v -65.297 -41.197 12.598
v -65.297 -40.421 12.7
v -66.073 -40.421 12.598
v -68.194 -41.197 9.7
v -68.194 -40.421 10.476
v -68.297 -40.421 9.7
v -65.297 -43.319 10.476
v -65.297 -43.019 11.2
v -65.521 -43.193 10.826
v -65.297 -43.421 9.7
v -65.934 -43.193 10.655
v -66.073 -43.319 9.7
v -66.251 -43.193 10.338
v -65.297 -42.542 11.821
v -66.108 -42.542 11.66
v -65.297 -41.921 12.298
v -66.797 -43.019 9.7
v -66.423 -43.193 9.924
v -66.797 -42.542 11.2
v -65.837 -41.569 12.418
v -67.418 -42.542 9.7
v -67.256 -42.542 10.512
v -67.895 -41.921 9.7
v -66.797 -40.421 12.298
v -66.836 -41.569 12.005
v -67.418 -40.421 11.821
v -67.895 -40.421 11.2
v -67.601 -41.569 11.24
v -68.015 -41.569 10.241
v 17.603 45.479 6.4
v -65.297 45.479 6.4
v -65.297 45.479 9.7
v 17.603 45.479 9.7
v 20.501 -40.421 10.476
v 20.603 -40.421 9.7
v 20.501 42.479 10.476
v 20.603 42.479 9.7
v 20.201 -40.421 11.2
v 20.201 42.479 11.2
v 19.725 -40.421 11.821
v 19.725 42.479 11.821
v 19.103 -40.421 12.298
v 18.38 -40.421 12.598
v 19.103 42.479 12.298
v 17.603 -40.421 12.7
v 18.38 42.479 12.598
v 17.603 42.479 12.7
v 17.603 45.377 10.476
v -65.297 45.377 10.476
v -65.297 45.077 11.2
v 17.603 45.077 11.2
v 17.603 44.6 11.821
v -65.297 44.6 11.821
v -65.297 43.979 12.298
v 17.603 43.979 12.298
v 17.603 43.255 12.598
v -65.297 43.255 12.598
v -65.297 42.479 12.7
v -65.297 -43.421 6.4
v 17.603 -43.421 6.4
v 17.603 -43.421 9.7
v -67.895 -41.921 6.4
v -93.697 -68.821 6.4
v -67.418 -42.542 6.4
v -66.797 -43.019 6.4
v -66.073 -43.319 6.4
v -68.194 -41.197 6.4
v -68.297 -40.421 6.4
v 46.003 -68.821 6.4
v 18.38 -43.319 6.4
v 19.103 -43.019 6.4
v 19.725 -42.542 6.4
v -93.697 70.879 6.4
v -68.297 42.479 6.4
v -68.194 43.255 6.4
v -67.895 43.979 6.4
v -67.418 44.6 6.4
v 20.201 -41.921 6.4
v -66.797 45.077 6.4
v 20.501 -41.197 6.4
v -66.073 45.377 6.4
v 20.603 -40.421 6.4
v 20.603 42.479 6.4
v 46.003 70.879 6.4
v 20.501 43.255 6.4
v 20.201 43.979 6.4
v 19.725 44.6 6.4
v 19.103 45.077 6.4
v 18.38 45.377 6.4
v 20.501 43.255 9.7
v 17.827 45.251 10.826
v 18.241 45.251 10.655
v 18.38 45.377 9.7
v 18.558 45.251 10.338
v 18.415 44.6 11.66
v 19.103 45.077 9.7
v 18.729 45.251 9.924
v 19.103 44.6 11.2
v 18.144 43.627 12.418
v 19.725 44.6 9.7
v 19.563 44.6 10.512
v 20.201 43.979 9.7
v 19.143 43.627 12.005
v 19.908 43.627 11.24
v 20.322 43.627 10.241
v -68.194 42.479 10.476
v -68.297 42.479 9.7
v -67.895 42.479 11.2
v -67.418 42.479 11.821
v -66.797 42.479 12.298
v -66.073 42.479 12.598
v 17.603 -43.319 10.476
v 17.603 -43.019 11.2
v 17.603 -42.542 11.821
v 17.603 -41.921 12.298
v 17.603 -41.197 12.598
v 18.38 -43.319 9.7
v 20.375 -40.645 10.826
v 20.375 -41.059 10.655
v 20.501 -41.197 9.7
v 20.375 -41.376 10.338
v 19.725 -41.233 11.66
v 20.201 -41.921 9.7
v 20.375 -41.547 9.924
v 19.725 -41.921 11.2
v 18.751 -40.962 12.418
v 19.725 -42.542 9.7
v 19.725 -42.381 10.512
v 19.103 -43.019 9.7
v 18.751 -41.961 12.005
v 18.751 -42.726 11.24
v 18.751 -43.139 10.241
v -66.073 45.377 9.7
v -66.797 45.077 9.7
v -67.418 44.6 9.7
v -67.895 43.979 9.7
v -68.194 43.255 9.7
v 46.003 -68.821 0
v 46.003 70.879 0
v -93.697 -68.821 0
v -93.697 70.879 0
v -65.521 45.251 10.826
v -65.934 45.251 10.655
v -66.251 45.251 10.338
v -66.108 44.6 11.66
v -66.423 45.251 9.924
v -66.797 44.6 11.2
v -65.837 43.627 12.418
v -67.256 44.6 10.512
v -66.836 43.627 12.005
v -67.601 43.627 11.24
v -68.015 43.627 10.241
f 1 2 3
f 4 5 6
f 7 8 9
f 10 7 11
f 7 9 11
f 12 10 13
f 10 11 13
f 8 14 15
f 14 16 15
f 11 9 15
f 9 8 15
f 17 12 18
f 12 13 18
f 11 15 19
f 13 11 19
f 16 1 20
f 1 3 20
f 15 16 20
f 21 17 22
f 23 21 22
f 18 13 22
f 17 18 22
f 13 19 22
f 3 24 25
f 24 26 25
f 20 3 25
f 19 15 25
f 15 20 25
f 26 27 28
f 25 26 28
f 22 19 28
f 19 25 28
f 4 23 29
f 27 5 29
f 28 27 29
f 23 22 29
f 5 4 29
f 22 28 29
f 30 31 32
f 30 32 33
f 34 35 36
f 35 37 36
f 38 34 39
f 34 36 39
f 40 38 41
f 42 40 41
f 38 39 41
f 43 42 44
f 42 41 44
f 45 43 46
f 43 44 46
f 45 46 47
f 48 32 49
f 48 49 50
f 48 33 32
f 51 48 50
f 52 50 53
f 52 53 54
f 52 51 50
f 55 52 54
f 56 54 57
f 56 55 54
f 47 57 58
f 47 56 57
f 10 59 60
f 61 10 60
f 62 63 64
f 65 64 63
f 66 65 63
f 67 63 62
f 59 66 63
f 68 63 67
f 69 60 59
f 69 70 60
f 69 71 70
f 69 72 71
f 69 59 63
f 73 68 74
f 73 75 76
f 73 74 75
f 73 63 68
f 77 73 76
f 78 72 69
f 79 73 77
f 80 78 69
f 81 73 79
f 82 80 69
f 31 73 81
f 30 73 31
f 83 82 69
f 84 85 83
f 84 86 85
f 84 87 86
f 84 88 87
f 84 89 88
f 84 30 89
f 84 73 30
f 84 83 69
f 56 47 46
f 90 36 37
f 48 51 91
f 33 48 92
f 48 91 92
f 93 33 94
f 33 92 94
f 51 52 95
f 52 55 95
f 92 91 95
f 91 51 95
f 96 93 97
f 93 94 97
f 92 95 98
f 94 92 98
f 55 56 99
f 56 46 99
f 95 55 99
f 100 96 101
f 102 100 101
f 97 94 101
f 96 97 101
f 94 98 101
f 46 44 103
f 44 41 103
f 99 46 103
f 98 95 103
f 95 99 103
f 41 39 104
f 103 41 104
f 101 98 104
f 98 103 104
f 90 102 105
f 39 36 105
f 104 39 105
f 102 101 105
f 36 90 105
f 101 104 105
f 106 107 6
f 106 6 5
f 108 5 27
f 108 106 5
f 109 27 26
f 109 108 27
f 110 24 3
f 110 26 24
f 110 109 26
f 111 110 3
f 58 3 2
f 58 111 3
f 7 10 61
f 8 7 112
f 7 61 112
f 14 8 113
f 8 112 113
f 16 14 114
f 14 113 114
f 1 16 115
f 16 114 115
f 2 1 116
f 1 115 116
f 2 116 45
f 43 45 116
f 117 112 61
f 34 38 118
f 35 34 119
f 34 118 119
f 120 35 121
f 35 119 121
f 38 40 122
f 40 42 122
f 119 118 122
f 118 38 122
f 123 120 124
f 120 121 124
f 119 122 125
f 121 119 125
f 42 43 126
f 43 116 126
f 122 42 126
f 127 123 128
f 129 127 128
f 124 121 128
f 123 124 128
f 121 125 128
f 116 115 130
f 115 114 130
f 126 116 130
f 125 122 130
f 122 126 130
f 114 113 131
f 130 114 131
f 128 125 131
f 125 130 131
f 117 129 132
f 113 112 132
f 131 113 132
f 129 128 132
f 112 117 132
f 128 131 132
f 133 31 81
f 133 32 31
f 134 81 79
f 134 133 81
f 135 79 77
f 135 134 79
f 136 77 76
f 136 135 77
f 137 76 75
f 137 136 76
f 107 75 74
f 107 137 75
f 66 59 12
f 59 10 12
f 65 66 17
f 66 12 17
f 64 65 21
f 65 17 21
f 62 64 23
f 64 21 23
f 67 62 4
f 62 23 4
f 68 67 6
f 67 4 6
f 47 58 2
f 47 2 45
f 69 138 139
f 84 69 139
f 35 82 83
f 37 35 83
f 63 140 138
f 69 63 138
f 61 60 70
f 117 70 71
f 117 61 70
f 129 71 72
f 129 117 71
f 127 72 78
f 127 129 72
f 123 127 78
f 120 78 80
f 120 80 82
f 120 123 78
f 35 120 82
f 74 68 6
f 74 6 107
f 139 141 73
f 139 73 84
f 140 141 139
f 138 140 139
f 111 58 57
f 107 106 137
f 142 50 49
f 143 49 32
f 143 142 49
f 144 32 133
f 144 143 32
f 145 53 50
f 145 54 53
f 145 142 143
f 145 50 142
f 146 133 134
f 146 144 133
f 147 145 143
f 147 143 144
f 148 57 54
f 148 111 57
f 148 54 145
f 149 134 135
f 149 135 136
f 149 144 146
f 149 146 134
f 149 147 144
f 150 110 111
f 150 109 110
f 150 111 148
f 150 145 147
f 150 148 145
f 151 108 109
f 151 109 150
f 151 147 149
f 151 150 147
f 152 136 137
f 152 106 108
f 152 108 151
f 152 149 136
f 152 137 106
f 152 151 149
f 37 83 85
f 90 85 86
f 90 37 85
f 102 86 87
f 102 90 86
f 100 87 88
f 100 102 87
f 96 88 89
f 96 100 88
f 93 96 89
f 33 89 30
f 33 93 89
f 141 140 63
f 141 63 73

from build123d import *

# Parameters (mm, degrees)
F0_W     = 88.9
F0_H     = 88.9
F1_DEPTH = 12.7
F0_W_2   = 139.7
F0_H_2   = 139.7
F2_DEPTH = 6.4
F3_R     = 3


with BuildPart() as f1:
    # F0 (on Top) → F1 (new body)
    with BuildSketch(Plane.XY):
        with Locations((-23.846633, 1.028963)):
            Rectangle(F0_W, F0_H)
    extrude(amount=F1_DEPTH)

    # F0 (on Top) → F2 (join)
    with BuildSketch(Plane.XY):
        with Locations((-23.846633, 1.028963)):
            Rectangle(F0_W_2, F0_H_2)
        with Locations((-23.846633, 1.028963)):
            Rectangle(F0_W, F0_H, mode=Mode.SUBTRACT)
    extrude(amount=F2_DEPTH)

    # F3
    f3_edges = [f1.edges().sort_by_distance(p)[0] for p in [
        (-68.296633, 1.028963, 12.7),
        (-23.846633, -43.421037, 12.7),
        (20.603367, 1.028963, 12.7),
        (-23.846633, 45.478963, 12.7),
        (20.603367, -43.421037, 9.55),
        (-68.296633, -43.421037, 9.55),
        (-68.296633, 45.478963, 9.55),
        (20.603367, 45.478963, 9.55),
    ]]
    fillet(f3_edges, radius=F3_R)


solid = f1.part
